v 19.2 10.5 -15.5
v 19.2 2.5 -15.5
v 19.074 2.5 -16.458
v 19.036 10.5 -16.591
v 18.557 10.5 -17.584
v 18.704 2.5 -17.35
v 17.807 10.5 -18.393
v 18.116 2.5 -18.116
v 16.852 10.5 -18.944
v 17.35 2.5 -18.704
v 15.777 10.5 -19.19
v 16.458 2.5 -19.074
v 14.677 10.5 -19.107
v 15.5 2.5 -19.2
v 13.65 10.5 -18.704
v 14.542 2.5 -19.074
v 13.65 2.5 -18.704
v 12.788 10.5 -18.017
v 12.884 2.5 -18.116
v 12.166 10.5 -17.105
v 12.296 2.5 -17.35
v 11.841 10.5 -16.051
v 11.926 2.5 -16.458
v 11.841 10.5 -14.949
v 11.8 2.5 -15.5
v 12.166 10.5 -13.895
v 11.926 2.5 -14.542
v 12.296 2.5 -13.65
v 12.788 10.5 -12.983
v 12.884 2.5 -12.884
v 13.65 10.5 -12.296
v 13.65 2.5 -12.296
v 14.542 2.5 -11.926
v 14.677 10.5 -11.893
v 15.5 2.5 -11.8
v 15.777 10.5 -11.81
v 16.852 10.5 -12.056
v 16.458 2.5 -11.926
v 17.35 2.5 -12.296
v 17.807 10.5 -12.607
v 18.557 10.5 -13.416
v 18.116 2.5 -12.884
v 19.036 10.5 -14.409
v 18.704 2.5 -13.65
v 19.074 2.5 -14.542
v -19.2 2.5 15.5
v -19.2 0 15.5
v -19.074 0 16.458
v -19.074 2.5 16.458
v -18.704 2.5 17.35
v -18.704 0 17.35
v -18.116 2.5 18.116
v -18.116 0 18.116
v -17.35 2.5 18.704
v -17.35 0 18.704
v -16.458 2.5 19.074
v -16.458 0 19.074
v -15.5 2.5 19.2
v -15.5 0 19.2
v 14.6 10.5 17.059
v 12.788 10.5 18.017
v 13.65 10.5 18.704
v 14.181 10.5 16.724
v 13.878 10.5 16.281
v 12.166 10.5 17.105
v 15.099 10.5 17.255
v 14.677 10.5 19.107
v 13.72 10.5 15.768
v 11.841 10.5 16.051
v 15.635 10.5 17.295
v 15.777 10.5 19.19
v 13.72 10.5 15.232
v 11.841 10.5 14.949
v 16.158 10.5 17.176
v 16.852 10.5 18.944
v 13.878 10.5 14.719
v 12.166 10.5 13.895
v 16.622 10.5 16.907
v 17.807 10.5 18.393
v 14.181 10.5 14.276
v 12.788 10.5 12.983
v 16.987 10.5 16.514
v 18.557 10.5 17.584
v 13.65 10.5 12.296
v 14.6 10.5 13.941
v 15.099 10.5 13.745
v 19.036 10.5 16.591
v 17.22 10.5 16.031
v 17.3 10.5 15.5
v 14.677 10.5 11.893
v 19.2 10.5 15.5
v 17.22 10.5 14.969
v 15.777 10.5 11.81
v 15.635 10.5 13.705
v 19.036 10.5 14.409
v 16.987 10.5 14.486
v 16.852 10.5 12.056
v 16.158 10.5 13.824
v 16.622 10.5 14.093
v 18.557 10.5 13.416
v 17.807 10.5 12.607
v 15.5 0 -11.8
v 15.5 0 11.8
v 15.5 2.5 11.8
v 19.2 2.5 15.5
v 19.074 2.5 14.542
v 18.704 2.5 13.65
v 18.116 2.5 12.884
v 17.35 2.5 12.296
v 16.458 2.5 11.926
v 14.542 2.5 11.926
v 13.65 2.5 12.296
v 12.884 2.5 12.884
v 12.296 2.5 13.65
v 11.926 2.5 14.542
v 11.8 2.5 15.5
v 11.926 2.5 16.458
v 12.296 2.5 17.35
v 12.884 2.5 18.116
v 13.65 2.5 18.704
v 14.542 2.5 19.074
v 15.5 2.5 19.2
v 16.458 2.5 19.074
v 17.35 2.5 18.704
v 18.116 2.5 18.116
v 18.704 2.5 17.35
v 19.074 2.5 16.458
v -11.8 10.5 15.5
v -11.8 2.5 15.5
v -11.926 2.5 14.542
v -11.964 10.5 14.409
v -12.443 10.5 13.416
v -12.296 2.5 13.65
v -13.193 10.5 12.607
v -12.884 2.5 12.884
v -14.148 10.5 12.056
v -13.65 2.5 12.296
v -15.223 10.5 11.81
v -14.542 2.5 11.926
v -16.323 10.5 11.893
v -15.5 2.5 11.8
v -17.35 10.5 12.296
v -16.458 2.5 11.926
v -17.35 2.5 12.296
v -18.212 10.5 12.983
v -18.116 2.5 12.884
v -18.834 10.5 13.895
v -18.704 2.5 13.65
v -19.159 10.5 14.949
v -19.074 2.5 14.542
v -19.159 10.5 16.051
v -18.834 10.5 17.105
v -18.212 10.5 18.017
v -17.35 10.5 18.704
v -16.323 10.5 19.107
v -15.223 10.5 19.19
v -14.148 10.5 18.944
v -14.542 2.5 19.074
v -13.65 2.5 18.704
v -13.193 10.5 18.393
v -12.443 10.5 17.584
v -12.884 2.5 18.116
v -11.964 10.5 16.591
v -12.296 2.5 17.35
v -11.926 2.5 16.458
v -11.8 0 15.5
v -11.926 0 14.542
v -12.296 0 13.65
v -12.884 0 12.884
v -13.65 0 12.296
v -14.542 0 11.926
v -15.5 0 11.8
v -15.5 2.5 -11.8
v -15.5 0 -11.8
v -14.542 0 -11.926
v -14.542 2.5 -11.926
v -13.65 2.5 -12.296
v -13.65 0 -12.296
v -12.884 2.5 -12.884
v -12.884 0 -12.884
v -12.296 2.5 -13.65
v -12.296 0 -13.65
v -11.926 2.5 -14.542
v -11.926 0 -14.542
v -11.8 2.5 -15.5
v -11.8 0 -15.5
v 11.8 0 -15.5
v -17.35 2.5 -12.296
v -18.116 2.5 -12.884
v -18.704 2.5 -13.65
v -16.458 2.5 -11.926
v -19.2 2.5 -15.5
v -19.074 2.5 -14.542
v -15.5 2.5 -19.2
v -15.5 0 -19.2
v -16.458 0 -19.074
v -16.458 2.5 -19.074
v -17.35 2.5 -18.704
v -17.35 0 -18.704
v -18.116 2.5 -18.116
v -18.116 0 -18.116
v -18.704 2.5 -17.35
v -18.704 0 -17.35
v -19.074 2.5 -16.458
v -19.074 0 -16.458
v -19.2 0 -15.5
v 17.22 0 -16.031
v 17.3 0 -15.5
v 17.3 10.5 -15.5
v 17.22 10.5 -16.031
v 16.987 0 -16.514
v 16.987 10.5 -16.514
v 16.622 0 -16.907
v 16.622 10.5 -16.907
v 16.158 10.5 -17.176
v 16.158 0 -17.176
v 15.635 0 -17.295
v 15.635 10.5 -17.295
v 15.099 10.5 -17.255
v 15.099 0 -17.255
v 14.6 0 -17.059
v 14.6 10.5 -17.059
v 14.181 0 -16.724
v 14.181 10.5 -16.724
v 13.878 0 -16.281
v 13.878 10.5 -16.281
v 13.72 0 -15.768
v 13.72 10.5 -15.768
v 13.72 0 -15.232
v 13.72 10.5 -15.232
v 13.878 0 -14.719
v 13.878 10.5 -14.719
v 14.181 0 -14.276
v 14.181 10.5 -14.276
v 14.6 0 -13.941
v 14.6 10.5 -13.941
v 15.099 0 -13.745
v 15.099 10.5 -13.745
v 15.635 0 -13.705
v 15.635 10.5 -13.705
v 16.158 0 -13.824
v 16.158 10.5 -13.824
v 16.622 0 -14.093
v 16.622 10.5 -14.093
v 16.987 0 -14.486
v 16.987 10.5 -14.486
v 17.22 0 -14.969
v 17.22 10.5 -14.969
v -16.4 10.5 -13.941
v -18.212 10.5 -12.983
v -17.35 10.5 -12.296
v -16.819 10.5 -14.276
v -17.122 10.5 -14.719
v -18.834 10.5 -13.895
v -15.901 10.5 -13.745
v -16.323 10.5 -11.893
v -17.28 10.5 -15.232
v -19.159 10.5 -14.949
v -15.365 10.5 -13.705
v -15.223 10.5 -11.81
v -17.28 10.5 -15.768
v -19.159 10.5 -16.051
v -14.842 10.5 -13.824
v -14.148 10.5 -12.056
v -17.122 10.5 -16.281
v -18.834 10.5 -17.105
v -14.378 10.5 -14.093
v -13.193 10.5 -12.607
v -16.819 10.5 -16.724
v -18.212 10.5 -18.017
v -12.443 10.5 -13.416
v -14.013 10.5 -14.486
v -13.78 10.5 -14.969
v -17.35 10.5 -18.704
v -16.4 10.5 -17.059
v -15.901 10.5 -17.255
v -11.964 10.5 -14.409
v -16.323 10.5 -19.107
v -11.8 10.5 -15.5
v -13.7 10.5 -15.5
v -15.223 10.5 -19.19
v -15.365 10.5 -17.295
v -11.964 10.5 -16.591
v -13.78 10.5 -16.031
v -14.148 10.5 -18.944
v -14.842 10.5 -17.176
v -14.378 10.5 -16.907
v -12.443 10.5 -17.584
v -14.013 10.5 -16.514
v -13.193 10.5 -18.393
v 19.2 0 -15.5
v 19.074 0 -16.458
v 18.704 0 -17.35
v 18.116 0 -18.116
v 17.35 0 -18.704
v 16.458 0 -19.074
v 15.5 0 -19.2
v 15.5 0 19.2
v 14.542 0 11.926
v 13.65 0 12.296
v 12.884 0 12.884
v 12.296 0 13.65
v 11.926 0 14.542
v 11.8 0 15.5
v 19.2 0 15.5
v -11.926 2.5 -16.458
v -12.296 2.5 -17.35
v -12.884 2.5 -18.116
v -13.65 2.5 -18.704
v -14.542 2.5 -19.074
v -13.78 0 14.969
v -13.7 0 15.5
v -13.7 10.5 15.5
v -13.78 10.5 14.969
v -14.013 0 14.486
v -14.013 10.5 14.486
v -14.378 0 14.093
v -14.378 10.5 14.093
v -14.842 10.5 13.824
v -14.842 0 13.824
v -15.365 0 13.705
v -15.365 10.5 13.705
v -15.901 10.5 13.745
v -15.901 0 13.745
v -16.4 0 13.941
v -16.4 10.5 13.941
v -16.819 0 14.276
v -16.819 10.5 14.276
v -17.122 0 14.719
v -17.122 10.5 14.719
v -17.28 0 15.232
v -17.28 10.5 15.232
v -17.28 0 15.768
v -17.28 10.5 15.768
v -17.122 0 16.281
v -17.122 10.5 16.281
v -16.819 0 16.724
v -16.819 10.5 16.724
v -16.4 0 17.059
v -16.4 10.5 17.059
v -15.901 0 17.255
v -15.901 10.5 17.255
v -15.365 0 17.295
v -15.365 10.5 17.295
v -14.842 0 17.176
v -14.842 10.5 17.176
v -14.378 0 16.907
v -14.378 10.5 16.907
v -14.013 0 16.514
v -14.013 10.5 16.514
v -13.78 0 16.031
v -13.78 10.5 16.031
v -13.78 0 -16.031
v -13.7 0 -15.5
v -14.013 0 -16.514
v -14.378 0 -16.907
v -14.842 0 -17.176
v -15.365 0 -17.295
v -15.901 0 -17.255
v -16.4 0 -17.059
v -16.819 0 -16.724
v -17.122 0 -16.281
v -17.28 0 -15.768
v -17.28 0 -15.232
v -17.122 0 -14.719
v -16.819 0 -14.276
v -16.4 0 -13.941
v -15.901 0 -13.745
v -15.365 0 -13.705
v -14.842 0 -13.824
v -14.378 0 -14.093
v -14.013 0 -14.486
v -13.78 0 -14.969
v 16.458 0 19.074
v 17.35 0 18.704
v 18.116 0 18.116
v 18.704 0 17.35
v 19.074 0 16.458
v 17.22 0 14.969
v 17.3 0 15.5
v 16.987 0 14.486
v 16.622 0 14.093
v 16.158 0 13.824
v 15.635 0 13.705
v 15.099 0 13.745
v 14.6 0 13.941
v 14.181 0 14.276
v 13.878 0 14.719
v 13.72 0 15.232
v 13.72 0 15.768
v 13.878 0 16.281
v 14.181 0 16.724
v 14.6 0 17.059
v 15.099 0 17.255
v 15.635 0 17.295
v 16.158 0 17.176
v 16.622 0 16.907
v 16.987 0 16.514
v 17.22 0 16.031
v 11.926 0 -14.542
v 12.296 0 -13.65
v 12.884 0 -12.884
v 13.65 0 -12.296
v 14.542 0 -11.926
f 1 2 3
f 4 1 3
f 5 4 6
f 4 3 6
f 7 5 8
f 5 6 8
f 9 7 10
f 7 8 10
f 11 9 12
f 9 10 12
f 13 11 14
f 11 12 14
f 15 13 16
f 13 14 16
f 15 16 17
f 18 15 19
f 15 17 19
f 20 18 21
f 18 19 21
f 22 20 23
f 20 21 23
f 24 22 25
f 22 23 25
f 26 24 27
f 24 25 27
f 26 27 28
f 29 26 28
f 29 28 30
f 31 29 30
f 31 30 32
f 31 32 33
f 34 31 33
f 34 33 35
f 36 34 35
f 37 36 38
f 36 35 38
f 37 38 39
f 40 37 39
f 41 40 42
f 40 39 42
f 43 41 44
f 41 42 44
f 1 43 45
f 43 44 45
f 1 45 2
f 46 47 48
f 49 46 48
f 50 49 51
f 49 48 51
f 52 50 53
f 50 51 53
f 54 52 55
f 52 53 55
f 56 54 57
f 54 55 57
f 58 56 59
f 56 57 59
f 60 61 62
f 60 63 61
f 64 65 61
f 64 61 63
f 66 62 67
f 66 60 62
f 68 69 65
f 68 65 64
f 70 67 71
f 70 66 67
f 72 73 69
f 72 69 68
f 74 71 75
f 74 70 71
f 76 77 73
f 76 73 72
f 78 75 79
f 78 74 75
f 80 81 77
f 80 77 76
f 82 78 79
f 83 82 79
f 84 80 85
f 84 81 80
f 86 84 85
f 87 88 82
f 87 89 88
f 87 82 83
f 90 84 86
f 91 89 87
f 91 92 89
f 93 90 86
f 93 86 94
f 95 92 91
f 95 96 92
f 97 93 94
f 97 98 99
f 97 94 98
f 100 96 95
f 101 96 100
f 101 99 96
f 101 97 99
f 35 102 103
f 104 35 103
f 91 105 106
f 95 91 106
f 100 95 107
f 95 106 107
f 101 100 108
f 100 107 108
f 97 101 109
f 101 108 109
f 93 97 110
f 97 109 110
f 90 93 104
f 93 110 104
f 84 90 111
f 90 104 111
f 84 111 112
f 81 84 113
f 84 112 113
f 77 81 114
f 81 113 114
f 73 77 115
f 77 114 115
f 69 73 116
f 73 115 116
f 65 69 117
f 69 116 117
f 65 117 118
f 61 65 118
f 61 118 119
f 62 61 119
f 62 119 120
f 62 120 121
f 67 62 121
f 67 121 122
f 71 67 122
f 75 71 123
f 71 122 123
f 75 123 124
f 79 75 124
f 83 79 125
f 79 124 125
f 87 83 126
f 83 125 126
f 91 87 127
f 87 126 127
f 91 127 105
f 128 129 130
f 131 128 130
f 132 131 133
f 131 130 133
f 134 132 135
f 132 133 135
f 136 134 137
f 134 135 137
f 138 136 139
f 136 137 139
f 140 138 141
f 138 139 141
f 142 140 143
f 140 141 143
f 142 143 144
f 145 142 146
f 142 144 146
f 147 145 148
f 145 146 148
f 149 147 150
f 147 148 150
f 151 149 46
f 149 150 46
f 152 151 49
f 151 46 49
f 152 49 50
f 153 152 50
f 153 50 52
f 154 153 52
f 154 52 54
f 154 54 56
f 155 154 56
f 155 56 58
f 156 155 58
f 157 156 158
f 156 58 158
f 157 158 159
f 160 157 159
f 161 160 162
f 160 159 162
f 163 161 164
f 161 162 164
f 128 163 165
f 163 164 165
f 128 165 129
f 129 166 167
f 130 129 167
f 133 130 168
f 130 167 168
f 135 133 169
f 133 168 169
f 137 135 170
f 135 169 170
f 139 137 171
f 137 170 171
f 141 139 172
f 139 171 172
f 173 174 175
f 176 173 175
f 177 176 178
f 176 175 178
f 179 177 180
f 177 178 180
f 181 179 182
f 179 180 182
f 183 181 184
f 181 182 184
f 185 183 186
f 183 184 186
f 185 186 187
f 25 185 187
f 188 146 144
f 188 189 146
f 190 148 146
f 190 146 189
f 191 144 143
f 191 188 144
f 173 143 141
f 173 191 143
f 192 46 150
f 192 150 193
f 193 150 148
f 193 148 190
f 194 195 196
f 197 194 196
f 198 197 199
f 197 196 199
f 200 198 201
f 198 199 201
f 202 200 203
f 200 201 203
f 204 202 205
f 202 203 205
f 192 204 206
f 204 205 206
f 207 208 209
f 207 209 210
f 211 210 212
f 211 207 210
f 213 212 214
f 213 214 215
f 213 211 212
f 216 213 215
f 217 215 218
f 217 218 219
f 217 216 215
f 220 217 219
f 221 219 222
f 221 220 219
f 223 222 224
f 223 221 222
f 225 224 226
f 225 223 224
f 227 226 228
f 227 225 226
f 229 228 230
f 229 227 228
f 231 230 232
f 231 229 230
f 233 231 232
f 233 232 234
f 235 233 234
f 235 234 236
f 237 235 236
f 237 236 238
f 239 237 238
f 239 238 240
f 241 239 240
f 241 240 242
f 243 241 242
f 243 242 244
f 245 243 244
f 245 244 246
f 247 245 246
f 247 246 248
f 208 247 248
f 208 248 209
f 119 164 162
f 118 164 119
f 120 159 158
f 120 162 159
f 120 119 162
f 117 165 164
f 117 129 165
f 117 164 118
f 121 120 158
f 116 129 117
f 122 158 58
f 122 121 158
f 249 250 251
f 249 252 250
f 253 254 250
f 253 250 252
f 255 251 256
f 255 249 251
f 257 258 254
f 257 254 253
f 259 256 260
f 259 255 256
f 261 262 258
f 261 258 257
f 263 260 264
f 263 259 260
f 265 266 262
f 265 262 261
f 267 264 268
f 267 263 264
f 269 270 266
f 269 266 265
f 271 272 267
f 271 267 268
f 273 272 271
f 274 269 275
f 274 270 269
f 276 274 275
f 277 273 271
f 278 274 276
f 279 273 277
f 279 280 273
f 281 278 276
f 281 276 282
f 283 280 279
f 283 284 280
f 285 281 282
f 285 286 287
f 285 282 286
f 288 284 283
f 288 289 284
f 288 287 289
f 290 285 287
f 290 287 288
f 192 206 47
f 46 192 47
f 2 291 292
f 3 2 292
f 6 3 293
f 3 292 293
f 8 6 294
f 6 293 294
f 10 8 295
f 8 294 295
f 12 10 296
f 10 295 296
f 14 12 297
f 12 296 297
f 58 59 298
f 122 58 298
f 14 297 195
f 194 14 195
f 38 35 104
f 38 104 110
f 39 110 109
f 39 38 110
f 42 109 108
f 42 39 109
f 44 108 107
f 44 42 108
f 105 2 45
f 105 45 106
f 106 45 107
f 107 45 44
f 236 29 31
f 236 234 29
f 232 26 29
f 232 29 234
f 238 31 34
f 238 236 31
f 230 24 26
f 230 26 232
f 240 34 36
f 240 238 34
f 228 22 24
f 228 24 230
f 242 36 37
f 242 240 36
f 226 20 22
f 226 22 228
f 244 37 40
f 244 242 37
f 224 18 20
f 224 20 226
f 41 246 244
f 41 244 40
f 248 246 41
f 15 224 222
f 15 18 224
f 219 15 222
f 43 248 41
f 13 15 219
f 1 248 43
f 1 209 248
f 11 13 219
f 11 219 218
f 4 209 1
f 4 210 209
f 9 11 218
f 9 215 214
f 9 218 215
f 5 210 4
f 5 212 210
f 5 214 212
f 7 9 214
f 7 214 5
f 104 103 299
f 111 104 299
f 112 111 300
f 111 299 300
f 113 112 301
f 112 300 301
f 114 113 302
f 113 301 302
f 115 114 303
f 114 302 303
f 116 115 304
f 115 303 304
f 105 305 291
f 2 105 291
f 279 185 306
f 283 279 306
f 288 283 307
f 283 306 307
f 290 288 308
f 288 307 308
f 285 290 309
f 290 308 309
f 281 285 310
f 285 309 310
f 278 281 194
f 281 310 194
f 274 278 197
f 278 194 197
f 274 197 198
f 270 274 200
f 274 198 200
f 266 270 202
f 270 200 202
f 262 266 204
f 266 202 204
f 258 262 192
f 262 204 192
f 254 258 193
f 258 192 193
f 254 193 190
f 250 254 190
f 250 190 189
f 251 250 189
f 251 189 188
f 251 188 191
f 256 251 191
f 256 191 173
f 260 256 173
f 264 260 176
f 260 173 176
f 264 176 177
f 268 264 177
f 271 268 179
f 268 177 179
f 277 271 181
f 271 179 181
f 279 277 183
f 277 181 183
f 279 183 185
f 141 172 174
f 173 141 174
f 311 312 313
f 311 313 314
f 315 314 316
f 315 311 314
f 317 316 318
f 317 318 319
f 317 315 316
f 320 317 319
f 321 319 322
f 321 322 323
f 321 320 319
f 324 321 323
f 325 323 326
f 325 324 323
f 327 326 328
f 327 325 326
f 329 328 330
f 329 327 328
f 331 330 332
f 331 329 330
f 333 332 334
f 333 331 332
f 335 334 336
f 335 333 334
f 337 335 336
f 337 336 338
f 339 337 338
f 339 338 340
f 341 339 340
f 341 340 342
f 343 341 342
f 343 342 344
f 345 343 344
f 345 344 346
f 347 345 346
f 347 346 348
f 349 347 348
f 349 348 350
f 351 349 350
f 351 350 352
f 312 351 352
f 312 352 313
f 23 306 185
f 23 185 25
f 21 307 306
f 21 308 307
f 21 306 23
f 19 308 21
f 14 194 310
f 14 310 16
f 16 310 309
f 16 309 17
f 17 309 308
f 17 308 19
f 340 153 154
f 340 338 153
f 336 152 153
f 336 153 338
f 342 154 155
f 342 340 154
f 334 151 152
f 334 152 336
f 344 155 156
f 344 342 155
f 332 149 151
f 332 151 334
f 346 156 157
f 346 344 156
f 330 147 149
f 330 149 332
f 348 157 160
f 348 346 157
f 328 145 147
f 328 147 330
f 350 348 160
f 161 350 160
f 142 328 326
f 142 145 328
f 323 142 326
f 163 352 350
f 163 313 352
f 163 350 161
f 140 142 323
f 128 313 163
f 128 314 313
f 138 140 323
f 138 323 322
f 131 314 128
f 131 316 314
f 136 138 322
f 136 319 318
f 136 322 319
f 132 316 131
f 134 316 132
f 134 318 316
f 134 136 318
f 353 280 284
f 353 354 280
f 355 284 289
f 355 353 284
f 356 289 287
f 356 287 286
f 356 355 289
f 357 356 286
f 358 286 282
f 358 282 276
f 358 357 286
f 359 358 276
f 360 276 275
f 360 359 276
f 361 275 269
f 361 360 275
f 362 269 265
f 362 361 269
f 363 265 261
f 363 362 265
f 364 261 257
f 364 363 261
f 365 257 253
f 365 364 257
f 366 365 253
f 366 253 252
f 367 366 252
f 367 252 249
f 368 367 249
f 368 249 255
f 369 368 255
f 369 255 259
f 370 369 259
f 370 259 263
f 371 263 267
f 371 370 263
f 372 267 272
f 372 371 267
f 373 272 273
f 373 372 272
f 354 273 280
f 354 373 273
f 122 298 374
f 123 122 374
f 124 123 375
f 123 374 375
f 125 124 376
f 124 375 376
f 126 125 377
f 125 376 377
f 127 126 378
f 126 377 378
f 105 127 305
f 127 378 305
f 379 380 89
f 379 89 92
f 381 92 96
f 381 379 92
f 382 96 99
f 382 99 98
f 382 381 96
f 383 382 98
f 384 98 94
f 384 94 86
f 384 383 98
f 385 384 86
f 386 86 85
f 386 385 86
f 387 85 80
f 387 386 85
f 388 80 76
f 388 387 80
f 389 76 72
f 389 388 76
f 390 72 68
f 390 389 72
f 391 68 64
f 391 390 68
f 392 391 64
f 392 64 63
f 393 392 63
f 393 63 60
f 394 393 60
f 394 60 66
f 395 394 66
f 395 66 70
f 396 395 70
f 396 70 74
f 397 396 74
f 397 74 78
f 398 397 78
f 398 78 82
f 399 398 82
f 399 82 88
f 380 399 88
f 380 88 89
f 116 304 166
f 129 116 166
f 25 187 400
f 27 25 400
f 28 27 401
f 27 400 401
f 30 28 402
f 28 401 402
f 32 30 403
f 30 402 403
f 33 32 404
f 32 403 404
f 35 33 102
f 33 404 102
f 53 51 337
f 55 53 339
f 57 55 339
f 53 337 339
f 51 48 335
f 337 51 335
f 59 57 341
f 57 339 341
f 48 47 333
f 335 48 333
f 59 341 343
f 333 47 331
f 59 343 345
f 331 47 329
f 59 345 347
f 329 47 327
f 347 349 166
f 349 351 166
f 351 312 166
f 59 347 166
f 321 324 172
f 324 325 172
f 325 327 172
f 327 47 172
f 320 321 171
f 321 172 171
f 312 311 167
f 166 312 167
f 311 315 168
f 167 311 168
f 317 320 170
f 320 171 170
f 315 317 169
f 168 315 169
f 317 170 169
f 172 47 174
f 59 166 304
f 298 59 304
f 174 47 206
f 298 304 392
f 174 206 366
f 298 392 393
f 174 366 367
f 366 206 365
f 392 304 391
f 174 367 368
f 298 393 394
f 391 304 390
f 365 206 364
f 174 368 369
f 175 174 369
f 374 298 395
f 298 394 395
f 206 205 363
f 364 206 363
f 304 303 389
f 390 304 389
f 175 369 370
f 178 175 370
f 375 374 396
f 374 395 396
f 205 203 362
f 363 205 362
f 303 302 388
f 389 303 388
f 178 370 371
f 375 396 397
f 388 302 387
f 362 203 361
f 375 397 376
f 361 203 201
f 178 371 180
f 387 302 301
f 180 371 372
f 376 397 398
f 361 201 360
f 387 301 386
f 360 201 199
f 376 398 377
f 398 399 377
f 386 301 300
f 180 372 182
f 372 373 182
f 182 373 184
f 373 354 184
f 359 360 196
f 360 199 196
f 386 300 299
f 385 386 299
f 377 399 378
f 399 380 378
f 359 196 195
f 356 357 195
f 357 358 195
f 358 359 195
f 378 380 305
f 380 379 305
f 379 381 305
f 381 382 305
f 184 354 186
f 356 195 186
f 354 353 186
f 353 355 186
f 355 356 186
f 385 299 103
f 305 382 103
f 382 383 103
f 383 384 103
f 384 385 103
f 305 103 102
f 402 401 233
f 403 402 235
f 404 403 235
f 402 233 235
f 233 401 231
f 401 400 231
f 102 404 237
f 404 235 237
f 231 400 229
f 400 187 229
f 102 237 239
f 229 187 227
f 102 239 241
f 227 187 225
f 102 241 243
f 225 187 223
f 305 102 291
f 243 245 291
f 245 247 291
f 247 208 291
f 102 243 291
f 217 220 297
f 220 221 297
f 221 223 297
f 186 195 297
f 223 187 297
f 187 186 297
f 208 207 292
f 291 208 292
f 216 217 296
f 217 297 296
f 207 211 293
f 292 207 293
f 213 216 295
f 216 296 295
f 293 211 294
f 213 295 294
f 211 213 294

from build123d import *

# Parameters (mm, degrees)
SKETCH_1_R      = 1.8
EXTRUDE_1_DEPTH = 2.5
SKETCH_2_R      = 3.7
SKETCH_2_R_2    = 1.8
EXTRUDE_2_DEPTH = 8


with BuildPart() as part:
    # 草图1 → 凸台-拉伸1 (new body)
    with BuildSketch(Plane(origin=(0, 0, 0), x_dir=(1, 0, 0), z_dir=(0, 1, 0))):
        with BuildLine():
            Line((-19.2, 15.5), (-19.2, -15.5))
            ThreePointArc((-19.2, -15.5), (-18.11629509, -18.11629509), (-15.5, -19.2))
            Line((-15.5, -19.2), (15.5, -19.2))
            ThreePointArc((15.5, -19.2), (18.11629509, -18.11629509), (19.2, -15.5))
            Line((19.2, -15.5), (19.2, 15.5))
            ThreePointArc((19.2, 15.5), (18.11629509, 18.11629509), (15.5, 19.2))
            Line((15.5, 19.2), (-15.5, 19.2))
            ThreePointArc((-15.5, 19.2), (-18.11629509, 18.11629509), (-19.2, 15.5))
        make_face()
        with Locations((-15.5, 15.5)):
            Circle(SKETCH_1_R, mode=Mode.SUBTRACT)
        with Locations((15.5, 15.5)):
            Circle(SKETCH_1_R, mode=Mode.SUBTRACT)
        with Locations((-15.5, -15.5)):
            Circle(SKETCH_1_R, mode=Mode.SUBTRACT)
        with Locations((15.5, -15.5)):
            Circle(SKETCH_1_R, mode=Mode.SUBTRACT)
        with BuildLine():
            Line((-11.8, 15.5), (11.8, 15.5))
            ThreePointArc((11.8, 15.5), (12.88370491, 12.88370491), (15.5, 11.8))
            Line((15.5, 11.8), (15.5, -11.8))
            ThreePointArc((15.5, -11.8), (12.88370491, -12.88370491), (11.8, -15.5))
            Line((11.8, -15.5), (-11.8, -15.5))
            ThreePointArc((-11.8, -15.5), (-12.88370491, -12.88370491), (-15.5, -11.8))
            Line((-15.5, -11.8), (-15.5, 11.8))
            ThreePointArc((-15.5, 11.8), (-12.88370491, 12.88370491), (-11.8, 15.5))
        make_face(mode=Mode.SUBTRACT)
    extrude(amount=EXTRUDE_1_DEPTH)

    # 草图2 → 凸台-拉伸2 (add)
    with BuildSketch(Plane(origin=(0, 2.5, 0), x_dir=(1, 0, 0), z_dir=(0, 1, 0))):
        with Locations((-15.5, 15.5)):
            Circle(SKETCH_2_R)
        with Locations((-15.5, 15.5)):
            Circle(SKETCH_2_R_2, mode=Mode.SUBTRACT)
        with Locations((15.5, 15.5)):
            Circle(SKETCH_2_R)
        with Locations((15.5, 15.5)):
            Circle(SKETCH_2_R_2, mode=Mode.SUBTRACT)
        with Locations((15.5, -15.5)):
            Circle(SKETCH_2_R)
        with Locations((15.5, -15.5)):
            Circle(SKETCH_2_R_2, mode=Mode.SUBTRACT)
        with Locations((-15.5, -15.5)):
            Circle(SKETCH_2_R)
        with Locations((-15.5, -15.5)):
            Circle(SKETCH_2_R_2, mode=Mode.SUBTRACT)
    extrude(amount=EXTRUDE_2_DEPTH)


solid = part.part
